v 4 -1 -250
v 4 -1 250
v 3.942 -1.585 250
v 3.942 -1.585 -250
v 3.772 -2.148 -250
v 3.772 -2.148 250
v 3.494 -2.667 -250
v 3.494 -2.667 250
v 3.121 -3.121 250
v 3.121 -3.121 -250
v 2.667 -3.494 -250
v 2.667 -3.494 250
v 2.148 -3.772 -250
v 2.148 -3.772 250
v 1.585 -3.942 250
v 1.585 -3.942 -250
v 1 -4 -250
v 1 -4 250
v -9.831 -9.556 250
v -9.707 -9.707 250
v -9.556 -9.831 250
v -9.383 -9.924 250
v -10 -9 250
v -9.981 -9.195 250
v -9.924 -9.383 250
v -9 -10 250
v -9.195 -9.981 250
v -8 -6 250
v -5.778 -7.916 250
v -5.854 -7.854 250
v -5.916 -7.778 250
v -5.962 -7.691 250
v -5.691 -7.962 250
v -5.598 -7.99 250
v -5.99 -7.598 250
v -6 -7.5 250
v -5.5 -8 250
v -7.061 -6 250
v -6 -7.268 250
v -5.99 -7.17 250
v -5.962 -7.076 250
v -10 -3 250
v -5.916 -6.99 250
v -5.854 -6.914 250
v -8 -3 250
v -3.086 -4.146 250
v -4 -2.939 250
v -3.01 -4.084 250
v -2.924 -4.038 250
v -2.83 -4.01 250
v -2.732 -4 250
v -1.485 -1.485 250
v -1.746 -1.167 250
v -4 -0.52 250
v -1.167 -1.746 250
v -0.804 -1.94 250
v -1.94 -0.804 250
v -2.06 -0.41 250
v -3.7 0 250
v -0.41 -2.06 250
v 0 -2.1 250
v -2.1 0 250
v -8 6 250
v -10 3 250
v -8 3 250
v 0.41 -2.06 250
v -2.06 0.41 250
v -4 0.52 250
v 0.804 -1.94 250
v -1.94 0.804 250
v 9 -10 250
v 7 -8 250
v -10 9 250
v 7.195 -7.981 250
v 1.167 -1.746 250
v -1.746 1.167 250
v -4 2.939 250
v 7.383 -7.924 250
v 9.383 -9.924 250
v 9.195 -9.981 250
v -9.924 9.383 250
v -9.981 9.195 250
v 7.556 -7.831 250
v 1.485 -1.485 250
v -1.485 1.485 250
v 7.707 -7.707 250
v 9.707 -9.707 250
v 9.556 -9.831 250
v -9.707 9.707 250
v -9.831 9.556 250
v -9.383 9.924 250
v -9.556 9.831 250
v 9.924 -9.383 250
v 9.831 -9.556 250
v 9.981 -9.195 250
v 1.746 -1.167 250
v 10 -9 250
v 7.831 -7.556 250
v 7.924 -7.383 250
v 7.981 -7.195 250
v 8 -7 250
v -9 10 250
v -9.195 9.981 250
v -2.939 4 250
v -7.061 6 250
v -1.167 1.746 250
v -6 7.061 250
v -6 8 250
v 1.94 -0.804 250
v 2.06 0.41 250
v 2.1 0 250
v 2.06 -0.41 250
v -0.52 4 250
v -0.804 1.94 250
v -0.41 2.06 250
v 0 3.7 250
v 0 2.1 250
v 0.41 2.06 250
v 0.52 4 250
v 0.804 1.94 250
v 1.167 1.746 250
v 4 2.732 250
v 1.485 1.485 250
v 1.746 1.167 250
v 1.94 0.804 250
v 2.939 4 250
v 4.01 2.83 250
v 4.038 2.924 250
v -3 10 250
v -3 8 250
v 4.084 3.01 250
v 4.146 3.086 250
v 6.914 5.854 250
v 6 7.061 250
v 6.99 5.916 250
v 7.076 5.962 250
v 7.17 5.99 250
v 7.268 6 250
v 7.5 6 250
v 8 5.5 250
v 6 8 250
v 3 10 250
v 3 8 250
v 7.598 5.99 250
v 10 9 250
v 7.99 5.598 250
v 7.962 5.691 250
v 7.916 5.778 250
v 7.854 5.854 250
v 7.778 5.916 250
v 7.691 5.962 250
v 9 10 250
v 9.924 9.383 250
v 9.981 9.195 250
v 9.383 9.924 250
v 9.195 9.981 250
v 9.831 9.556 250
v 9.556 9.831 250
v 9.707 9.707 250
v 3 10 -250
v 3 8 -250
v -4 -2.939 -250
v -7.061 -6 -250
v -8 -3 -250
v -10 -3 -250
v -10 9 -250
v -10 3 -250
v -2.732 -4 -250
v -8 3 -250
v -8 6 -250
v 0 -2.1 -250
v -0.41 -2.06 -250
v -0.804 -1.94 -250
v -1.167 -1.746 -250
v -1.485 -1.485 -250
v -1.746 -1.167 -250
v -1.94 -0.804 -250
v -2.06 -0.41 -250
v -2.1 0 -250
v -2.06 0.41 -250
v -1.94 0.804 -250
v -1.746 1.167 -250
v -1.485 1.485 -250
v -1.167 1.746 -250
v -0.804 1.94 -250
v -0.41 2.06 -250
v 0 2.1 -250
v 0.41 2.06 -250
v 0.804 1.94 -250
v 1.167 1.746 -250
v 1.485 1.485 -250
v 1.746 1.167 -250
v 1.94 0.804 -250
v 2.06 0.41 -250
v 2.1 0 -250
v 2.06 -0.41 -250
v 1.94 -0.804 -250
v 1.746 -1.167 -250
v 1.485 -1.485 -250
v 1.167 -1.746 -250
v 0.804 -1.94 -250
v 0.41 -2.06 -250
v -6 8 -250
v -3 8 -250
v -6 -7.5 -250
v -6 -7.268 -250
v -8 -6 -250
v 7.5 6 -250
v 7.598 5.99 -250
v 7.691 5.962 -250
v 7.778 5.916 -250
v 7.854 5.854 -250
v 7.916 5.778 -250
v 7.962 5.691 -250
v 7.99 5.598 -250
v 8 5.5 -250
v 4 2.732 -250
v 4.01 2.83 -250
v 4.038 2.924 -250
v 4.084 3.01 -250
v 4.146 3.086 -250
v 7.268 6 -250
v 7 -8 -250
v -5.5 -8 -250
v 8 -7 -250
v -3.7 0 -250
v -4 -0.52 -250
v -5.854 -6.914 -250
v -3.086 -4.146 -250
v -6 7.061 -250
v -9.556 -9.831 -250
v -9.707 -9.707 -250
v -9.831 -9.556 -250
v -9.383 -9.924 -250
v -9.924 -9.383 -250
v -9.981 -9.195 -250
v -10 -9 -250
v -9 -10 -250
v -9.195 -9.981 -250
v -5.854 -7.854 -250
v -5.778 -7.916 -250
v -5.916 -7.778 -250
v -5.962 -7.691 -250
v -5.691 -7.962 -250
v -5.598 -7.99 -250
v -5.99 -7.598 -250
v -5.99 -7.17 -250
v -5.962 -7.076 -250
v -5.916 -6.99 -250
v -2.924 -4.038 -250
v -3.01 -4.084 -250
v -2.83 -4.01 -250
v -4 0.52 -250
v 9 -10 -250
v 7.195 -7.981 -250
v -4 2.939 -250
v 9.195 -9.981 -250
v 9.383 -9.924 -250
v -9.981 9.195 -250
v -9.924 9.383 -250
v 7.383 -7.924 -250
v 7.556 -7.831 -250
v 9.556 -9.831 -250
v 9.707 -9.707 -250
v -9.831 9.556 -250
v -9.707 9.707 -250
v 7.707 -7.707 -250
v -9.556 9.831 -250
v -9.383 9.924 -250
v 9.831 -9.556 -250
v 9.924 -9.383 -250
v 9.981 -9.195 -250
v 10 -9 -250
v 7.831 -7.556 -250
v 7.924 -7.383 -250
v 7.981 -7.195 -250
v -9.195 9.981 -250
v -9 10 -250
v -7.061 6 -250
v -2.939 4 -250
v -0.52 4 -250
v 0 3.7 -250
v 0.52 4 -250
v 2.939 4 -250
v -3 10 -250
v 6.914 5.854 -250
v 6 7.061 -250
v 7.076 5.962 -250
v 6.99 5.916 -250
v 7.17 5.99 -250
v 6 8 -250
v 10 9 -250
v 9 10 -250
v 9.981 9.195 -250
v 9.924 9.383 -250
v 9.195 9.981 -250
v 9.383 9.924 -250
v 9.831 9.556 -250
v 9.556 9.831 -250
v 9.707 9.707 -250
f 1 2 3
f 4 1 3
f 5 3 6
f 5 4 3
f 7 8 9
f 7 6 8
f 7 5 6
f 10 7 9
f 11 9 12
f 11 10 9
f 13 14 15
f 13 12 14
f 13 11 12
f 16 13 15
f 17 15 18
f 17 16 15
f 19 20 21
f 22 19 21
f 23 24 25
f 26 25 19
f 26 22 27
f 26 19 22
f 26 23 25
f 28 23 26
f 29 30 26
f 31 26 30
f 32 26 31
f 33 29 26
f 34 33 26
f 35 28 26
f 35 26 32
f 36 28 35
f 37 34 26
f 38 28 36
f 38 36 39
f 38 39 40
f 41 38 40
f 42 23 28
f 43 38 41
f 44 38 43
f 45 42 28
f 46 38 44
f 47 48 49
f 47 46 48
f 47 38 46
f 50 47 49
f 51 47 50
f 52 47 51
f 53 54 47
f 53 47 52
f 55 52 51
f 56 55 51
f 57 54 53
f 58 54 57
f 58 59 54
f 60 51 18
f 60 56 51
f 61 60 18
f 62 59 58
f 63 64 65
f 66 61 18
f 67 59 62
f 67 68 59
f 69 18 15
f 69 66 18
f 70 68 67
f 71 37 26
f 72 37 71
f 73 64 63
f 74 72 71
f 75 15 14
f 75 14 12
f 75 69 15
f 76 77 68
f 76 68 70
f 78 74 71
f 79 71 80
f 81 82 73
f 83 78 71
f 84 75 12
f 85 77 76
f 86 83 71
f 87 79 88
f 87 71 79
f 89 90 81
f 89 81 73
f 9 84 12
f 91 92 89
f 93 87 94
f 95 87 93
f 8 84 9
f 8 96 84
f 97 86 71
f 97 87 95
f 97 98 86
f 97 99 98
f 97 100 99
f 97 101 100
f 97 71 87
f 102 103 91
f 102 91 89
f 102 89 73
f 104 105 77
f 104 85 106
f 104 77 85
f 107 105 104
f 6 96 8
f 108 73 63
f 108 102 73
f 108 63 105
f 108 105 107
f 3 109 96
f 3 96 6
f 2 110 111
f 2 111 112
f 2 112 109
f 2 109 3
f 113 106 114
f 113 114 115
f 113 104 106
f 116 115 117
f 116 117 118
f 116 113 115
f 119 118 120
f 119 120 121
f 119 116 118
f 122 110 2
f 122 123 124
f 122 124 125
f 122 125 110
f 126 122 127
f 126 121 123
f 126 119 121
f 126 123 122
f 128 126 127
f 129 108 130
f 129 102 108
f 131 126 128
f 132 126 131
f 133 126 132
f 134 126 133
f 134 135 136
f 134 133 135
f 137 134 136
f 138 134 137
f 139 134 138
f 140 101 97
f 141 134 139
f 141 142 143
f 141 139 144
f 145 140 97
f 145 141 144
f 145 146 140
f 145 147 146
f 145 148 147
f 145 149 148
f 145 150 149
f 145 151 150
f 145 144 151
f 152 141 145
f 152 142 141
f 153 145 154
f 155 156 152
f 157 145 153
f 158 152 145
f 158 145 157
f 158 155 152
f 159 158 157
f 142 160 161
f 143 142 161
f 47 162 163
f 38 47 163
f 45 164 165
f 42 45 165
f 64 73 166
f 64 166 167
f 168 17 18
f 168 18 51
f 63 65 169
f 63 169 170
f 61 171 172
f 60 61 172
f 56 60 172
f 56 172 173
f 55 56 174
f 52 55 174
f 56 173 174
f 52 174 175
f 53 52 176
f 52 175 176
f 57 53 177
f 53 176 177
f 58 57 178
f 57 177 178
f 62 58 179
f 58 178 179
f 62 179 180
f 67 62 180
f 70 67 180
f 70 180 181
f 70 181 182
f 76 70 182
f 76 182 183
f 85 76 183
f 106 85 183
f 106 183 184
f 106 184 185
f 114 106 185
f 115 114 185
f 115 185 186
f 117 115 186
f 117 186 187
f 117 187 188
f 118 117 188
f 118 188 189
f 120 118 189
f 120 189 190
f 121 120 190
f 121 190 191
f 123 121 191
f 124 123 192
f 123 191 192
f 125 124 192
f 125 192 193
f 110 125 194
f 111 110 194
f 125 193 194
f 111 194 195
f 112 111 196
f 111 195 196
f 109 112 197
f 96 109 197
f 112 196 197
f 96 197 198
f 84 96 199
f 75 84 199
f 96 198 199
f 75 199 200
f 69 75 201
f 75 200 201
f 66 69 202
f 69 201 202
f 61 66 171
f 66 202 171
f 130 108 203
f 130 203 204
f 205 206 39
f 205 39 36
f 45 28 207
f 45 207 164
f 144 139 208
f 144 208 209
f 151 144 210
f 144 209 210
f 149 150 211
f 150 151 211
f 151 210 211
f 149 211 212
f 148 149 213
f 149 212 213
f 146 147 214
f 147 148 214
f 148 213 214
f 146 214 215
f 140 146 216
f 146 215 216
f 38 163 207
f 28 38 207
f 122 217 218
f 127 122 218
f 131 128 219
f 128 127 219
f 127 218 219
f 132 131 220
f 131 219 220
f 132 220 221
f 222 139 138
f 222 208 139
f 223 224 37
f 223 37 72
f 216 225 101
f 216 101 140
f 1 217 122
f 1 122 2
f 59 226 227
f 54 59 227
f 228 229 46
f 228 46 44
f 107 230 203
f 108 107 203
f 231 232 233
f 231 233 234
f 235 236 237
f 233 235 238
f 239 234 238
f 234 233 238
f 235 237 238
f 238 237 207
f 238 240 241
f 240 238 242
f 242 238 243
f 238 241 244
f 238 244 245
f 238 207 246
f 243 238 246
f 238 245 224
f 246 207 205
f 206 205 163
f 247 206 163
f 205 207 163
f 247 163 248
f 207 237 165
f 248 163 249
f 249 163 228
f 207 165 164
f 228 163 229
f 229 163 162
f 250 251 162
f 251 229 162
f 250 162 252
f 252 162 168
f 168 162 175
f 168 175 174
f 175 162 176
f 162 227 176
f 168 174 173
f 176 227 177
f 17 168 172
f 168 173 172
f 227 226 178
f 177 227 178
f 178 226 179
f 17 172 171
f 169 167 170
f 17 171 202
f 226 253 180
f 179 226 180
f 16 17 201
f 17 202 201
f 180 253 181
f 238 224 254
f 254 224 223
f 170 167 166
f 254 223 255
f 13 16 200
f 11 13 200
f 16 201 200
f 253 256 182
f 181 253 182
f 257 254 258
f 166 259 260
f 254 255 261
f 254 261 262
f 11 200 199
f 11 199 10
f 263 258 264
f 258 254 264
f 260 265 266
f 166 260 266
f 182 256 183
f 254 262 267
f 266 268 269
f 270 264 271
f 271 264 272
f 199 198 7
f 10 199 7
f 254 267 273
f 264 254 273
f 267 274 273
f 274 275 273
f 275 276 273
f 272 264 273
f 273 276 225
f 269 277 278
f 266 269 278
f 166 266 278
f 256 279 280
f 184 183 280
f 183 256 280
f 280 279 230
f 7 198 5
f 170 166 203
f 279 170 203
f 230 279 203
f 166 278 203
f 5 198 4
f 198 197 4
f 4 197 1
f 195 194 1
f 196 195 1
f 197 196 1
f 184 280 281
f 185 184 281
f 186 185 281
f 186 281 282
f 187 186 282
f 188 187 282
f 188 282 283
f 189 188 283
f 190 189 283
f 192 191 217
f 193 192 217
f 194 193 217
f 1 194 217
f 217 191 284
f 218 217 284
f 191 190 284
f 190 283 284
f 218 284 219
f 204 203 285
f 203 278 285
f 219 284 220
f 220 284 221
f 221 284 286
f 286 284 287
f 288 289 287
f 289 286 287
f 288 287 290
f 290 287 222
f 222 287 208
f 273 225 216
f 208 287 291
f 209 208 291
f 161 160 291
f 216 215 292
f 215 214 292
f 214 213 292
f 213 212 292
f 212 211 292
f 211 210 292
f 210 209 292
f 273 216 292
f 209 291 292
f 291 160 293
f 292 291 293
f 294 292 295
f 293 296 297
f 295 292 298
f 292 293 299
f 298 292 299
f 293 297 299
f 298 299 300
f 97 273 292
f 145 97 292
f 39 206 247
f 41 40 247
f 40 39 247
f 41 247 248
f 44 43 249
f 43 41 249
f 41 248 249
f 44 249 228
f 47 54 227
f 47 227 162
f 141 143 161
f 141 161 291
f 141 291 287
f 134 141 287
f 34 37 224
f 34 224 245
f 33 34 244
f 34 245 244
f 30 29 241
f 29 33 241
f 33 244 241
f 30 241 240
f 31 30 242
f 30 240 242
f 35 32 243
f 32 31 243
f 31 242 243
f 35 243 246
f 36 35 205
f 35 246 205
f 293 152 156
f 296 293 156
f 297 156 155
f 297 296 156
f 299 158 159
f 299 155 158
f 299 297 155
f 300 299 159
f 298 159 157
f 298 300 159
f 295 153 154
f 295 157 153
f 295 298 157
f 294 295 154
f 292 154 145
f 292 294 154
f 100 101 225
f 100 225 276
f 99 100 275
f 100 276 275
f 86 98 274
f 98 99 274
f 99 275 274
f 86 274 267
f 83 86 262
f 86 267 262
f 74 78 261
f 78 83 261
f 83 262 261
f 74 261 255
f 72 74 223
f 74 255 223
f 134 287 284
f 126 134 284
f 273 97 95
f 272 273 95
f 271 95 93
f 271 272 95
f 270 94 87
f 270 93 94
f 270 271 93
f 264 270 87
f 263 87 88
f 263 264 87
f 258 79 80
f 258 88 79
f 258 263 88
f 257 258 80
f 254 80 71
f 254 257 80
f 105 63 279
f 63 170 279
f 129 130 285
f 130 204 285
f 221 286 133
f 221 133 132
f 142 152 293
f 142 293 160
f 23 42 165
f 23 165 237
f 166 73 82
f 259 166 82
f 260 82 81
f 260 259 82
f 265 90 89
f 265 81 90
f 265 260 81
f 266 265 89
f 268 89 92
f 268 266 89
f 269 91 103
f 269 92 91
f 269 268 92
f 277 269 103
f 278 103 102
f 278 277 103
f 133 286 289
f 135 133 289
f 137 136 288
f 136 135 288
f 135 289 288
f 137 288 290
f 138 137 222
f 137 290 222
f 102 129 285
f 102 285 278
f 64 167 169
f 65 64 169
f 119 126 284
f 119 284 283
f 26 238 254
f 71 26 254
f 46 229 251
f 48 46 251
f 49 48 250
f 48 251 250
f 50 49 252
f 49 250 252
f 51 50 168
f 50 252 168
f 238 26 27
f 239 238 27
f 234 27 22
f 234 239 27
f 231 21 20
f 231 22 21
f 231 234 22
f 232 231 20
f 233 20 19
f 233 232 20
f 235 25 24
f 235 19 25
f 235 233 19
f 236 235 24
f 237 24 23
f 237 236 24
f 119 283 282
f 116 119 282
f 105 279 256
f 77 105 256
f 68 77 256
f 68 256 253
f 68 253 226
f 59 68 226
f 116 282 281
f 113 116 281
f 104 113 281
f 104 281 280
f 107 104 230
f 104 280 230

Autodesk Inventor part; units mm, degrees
sketch "Sketch_64" plane through (0, 0, 0) normal (0, 0, 1) x (1, 0, 0)
  line L0 (-10, -3) -> (-10, -9)
  arc A0 (-10, -9) -> (-9, -10) centre (-9, -9) ccw
  line L1 (-9, -10) -> (9, -10)
  arc A1 (9, -10) -> (10, -9) centre (9, -9) ccw
  line L2 (10, -9) -> (10, 9)
  arc A2 (10, 9) -> (9, 10) centre (9, 9) ccw
  line L3 (9, 10) -> (3, 10)
  line L4 (3, 10) -> (3, 8)
  line L5 (3, 8) -> (6, 8)
  line L6 (6, 8) -> (6, 7.0607)
  line L7 (6, 7.0607) -> (2.9393, 4)
  line L8 (2.9393, 4) -> (0.5196, 4)
  line L9 (0.5196, 4) -> (0, 3.7)
  line L10 (0, 3.7) -> (-0.5196, 4)
  line L11 (-0.5196, 4) -> (-2.9393, 4)
  line L12 (-2.9393, 4) -> (-6, 7.0607)
  line L13 (-6, 7.0607) -> (-6, 8)
  line L14 (-6, 8) -> (-3, 8)
  line L15 (-3, 8) -> (-3, 10)
  line L16 (-3, 10) -> (-9, 10)
  arc A3 (-9, 10) -> (-10, 9) centre (-9, 9) ccw
  line L17 (-10, 9) -> (-10, 3)
  line L18 (-10, 3) -> (-8, 3)
  line L19 (-8, 3) -> (-8, 6)
  line L20 (-8, 6) -> (-7.0607, 6)
  line L21 (-7.0607, 6) -> (-4, 2.9393)
  line L22 (-4, 2.9393) -> (-4, 0.5196)
  line L23 (-4, 0.5196) -> (-3.7, 0)
  line L24 (-3.7, 0) -> (-4, -0.5196)
  line L25 (-4, -0.5196) -> (-4, -2.9393)
  line L26 (-4, -2.9393) -> (-7.0607, -6)
  line L27 (-7.0607, -6) -> (-8, -6)
  line L28 (-8, -6) -> (-8, -3)
  line L29 (-8, -3) -> (-10, -3)
  line L30 (-6, -7.2678) -> (-6, -7.5)
  arc A4 (-6, -7.5) -> (-5.5, -8) centre (-5.5, -7.5) ccw
  line L31 (-5.5, -8) -> (7, -8)
  arc A5 (7, -8) -> (8, -7) centre (7, -7) ccw
  line L32 (8, -7) -> (8, 5.5)
  arc A6 (8, 5.5) -> (7.5, 6) centre (7.5, 5.5) ccw
  line L33 (7.5, 6) -> (7.2678, 6)
  arc A7 (7.2678, 6) -> (6.9142, 5.8536) centre (7.2678, 5.5) ccw
  line L34 (6.9142, 5.8536) -> (4.1464, 3.0858)
  arc A8 (4.1464, 3.0858) -> (4, 2.7322) centre (4.5, 2.7322) ccw
  line L35 (4, 2.7322) -> (4, -1)
  arc A9 (1, -4) -> (4, -1) centre (1, -1) ccw
  line L36 (1, -4) -> (-2.7322, -4)
  arc A10 (-2.7322, -4) -> (-3.0858, -4.1464) centre (-2.7322, -4.5) ccw
  line L37 (-3.0858, -4.1464) -> (-5.8536, -6.9142)
  arc A11 (-5.8536, -6.9142) -> (-6, -7.2678) centre (-5.5, -7.2678) ccw
extrude "Extrusion1" add sketch "Sketch_64" along normal mid plane 500
sketch "Sketch2" plane through (0, 0, 250) normal (0, 0, 1) x (-1, 0, 0)
  point P0 (0, 0)
hole "Hole1" at (0, 0, 250) direction (0, 0, -1) diameter 4.2 end through all both
ref_plane "C1_XY" through (0, 0, 0) normal (0, 0, 1) x (1, 0, 0)
ref_plane "C1_YZ" through (0, 0, 0) normal (1, 0, 0) x (0, 1, 0)
ref_plane "C1_ZX" through (0, 0, 0) normal (0, 1, 0) x (0, 0, 1)
thread "Thread1" size "M5x0.8" class "6H" standard "ANSI Metric M Profile" length 10
thread "Thread2" size "M5x0.8" class "6H" standard "ANSI Metric M Profile" length 10
properties part number "HFST5-2020-500" material "Aluminum 6061"
